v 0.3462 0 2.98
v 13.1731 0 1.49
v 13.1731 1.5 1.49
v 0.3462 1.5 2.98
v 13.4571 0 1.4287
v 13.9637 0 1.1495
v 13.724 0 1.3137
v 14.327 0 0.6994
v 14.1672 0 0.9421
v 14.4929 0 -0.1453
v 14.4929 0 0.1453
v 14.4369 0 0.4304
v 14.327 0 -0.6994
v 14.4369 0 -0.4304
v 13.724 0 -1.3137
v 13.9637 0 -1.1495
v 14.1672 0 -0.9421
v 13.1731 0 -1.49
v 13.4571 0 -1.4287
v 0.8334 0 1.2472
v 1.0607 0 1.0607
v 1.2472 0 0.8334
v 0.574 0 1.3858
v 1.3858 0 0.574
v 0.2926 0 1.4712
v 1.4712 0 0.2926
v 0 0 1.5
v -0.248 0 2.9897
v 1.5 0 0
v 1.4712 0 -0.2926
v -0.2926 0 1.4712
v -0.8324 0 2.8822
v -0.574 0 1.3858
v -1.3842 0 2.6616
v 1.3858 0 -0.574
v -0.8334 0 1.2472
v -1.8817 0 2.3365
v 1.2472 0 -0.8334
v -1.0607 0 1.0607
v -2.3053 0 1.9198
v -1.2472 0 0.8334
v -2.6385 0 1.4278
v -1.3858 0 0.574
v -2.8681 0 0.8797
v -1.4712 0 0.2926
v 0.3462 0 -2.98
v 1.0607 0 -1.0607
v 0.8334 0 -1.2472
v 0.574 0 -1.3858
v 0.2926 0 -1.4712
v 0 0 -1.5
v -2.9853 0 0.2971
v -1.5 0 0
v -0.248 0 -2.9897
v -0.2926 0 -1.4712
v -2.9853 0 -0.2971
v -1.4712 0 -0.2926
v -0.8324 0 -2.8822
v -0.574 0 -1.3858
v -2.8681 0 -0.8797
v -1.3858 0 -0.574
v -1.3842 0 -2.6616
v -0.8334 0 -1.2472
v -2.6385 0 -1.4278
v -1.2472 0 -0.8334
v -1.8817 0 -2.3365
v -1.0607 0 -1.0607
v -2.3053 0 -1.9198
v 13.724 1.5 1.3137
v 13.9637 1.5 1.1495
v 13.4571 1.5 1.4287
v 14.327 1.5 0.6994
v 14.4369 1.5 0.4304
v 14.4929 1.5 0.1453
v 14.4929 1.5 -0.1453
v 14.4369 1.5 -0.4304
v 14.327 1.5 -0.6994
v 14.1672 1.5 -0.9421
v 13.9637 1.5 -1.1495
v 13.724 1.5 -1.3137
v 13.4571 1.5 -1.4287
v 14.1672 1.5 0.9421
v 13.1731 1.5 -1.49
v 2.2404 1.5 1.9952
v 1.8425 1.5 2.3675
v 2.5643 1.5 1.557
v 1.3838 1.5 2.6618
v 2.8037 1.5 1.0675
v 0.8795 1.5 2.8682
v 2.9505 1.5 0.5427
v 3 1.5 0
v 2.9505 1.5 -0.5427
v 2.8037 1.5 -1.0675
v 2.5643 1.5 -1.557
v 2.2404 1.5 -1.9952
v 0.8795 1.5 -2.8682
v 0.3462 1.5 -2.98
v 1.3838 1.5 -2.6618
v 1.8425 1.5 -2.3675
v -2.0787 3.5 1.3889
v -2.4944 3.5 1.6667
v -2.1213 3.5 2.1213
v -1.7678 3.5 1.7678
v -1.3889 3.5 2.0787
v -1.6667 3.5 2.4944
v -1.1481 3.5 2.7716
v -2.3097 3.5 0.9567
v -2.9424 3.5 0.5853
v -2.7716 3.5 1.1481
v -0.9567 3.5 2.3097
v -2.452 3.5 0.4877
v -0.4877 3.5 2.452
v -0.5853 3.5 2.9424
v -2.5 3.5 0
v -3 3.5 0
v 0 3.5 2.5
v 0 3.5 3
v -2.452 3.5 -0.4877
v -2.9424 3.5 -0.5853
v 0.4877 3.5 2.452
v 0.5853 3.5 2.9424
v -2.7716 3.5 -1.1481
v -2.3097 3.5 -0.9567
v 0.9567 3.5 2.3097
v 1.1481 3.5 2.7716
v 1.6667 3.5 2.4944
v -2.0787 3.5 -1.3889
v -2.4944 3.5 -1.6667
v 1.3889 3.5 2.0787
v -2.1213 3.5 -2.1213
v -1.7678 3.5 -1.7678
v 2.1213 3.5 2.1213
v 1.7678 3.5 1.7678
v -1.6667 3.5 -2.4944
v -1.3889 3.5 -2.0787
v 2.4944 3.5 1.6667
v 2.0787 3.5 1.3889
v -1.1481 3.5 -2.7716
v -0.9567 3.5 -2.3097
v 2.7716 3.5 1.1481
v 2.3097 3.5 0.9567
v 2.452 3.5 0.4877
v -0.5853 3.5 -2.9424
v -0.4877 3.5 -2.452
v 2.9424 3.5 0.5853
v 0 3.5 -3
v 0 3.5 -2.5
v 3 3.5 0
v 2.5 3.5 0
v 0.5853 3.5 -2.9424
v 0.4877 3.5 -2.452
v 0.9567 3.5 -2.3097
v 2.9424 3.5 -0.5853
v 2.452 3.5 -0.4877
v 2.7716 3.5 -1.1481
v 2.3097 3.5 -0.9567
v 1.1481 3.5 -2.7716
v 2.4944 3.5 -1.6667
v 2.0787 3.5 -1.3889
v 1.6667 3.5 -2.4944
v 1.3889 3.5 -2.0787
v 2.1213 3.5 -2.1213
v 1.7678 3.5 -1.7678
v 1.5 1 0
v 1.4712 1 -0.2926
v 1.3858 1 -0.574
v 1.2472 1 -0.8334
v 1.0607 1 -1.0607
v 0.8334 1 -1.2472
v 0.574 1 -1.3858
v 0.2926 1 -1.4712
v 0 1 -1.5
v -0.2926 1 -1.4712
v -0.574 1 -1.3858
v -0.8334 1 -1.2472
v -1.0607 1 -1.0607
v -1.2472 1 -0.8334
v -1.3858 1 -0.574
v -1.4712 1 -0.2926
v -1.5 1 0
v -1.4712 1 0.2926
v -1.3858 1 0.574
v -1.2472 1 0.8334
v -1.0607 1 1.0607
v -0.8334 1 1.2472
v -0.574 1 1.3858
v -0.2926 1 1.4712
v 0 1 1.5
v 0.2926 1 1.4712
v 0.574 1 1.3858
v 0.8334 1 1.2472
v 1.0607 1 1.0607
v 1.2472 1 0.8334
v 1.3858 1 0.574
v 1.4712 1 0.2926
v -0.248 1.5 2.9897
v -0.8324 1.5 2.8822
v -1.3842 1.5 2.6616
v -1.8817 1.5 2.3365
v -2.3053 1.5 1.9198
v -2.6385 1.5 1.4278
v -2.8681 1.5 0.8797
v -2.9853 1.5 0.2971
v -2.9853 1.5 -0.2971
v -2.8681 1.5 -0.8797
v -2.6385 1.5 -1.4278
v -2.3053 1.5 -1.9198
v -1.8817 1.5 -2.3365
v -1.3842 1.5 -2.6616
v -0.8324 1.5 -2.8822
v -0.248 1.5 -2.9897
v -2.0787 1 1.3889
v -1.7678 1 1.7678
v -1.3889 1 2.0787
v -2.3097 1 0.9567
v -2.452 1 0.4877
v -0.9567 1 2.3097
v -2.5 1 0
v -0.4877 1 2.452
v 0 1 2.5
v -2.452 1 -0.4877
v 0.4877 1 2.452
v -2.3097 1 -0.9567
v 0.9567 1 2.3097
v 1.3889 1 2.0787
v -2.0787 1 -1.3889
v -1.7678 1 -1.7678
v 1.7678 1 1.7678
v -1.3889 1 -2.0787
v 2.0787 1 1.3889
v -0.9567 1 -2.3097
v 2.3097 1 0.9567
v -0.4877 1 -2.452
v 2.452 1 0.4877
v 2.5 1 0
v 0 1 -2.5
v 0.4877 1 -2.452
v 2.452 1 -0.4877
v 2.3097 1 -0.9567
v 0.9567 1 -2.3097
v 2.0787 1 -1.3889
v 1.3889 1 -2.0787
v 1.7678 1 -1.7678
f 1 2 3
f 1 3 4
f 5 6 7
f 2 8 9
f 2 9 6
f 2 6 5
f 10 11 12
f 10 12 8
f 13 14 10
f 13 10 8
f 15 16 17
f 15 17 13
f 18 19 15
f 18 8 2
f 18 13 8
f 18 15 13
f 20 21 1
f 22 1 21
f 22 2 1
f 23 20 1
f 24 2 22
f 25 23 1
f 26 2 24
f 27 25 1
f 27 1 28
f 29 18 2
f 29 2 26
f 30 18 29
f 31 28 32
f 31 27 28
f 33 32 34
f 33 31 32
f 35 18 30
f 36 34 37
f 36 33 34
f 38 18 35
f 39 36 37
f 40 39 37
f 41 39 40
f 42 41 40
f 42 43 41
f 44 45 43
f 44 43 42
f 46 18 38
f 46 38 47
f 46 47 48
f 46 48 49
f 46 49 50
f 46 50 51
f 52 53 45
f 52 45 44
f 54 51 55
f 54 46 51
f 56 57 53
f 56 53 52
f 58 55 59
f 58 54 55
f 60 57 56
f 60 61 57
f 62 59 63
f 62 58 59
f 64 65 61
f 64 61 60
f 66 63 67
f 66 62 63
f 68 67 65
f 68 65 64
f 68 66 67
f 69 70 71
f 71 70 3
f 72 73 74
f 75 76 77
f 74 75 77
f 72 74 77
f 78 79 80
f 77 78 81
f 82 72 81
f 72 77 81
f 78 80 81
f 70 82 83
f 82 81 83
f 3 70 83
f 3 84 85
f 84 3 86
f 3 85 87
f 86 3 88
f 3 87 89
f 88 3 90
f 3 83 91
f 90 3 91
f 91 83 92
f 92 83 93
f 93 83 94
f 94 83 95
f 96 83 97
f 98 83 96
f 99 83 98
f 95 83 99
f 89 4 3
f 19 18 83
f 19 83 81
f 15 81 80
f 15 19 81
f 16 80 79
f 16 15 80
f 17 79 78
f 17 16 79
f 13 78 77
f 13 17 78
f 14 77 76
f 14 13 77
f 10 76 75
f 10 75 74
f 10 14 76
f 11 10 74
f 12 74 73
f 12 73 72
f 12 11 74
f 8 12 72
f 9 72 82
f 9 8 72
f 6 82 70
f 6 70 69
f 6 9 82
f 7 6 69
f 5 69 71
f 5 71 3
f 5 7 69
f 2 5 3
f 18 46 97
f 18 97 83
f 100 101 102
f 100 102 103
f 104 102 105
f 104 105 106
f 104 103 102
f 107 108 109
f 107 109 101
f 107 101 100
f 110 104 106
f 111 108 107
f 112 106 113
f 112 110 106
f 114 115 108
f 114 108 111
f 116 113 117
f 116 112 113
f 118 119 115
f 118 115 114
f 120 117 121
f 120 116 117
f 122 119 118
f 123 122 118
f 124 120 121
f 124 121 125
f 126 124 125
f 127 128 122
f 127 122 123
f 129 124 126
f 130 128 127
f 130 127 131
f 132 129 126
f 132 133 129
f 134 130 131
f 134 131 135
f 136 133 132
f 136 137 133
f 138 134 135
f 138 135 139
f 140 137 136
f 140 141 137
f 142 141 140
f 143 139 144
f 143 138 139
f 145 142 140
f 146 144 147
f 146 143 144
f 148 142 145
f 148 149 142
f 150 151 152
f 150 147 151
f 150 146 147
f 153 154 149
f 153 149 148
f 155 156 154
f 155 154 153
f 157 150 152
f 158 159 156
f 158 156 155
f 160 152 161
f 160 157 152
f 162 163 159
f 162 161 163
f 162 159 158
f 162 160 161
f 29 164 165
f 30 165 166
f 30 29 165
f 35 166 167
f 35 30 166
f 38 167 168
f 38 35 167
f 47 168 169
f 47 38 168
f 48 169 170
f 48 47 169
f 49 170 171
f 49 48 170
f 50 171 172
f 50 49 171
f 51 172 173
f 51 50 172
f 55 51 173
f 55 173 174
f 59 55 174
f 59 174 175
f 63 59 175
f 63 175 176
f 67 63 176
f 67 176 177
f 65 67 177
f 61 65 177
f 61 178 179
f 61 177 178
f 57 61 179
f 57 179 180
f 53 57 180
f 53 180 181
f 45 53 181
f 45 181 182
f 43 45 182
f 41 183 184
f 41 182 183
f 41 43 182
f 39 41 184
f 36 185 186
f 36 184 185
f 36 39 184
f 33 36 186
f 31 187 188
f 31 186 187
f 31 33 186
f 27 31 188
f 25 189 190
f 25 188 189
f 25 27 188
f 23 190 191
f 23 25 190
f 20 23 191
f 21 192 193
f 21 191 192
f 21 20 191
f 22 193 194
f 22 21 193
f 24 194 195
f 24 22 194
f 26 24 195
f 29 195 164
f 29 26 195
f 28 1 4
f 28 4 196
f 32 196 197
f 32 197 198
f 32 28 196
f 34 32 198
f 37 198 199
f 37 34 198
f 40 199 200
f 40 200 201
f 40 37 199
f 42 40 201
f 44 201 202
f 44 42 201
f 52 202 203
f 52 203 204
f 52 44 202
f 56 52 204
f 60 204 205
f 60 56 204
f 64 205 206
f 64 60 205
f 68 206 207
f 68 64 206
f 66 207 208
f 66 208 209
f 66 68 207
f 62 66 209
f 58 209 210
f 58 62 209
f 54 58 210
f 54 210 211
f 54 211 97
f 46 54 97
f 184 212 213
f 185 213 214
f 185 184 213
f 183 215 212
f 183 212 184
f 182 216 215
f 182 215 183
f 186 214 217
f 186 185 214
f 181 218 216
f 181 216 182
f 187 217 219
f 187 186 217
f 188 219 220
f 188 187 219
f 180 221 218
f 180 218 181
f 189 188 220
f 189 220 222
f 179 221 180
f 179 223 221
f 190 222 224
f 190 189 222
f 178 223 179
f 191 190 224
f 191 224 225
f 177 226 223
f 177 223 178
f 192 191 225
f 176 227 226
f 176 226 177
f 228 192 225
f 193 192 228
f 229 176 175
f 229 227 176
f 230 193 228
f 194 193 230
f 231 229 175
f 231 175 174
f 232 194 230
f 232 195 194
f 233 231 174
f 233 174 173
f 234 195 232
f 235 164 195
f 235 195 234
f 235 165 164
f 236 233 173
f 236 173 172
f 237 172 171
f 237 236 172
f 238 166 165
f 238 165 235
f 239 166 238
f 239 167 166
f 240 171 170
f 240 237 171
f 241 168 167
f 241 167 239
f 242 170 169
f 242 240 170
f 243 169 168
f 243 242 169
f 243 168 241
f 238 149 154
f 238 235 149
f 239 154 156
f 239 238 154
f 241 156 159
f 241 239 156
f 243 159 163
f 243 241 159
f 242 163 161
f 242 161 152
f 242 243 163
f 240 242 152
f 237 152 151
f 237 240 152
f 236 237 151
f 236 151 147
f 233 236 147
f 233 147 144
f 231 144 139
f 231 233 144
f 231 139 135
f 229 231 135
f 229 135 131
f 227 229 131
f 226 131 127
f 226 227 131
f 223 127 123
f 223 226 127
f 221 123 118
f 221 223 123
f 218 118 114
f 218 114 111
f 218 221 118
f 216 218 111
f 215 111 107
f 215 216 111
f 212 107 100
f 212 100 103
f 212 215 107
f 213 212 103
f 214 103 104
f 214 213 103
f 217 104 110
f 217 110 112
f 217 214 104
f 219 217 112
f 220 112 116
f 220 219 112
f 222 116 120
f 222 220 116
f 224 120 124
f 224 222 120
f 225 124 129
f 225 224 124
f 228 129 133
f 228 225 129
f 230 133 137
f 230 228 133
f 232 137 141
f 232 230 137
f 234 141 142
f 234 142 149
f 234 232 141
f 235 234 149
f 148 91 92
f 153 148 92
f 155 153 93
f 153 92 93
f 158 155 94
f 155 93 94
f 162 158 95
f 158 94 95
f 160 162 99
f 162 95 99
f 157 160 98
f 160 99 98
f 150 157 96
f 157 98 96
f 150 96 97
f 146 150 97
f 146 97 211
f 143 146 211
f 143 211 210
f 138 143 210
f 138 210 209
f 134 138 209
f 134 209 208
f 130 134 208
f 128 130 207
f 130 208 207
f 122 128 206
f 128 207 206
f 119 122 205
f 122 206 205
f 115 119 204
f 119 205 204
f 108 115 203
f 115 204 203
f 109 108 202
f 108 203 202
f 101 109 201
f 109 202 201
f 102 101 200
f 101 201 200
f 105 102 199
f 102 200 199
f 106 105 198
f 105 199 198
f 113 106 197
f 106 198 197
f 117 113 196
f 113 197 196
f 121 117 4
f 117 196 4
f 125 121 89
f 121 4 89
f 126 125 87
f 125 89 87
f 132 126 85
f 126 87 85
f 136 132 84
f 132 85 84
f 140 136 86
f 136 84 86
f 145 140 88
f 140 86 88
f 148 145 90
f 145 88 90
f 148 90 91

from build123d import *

# Parameters (mm, degrees)
SKETCH1_R           = 1.5
BOSS_EXTRUDE1_DEPTH = 1.5
SKETCH2_R           = 3
SKETCH2_R_2         = 2.5
BOSS_EXTRUDE2_DEPTH = 2
SKETCH3_R           = 2.5
CUT_EXTRUDE1_DEPTH  = 0.5


with BuildPart() as part:
    # Sketch1 → Boss-Extrude1 (new body)
    with BuildSketch(Plane(origin=(0, 0, 0), x_dir=(1, 0, 0), z_dir=(0, 1, 0))):
        with BuildLine():
            Line((0.346153846, 2.97996267), (13.173076923, 1.489981335))
            ThreePointArc((13.173076923, 1.489981335), (14.5, 0), (13.173076923, -1.489981335))
            Line((13.173076923, -1.489981335), (0.346153846, -2.97996267))
            ThreePointArc((0.346153846, -2.97996267), (-3, 0), (0.346153846, 2.97996267))
        make_face()
        Circle(SKETCH1_R, mode=Mode.SUBTRACT)
    extrude(amount=BOSS_EXTRUDE1_DEPTH)

    # Sketch2 → Boss-Extrude2 (add)
    with BuildSketch(Plane(origin=(0, 1.5, 0), x_dir=(1, 0, 0), z_dir=(0, 1, 0))):
        Circle(SKETCH2_R)
        Circle(SKETCH2_R_2, mode=Mode.SUBTRACT)
    extrude(amount=BOSS_EXTRUDE2_DEPTH)

    # Sketch3 → Cut-Extrude1 (cut)
    with BuildSketch(Plane(origin=(0, 1.5, 0), x_dir=(1, 0, 0), z_dir=(0, 1, 0))):
        Circle(SKETCH3_R)
    extrude(amount=-CUT_EXTRUDE1_DEPTH, mode=Mode.SUBTRACT)


solid = part.part
